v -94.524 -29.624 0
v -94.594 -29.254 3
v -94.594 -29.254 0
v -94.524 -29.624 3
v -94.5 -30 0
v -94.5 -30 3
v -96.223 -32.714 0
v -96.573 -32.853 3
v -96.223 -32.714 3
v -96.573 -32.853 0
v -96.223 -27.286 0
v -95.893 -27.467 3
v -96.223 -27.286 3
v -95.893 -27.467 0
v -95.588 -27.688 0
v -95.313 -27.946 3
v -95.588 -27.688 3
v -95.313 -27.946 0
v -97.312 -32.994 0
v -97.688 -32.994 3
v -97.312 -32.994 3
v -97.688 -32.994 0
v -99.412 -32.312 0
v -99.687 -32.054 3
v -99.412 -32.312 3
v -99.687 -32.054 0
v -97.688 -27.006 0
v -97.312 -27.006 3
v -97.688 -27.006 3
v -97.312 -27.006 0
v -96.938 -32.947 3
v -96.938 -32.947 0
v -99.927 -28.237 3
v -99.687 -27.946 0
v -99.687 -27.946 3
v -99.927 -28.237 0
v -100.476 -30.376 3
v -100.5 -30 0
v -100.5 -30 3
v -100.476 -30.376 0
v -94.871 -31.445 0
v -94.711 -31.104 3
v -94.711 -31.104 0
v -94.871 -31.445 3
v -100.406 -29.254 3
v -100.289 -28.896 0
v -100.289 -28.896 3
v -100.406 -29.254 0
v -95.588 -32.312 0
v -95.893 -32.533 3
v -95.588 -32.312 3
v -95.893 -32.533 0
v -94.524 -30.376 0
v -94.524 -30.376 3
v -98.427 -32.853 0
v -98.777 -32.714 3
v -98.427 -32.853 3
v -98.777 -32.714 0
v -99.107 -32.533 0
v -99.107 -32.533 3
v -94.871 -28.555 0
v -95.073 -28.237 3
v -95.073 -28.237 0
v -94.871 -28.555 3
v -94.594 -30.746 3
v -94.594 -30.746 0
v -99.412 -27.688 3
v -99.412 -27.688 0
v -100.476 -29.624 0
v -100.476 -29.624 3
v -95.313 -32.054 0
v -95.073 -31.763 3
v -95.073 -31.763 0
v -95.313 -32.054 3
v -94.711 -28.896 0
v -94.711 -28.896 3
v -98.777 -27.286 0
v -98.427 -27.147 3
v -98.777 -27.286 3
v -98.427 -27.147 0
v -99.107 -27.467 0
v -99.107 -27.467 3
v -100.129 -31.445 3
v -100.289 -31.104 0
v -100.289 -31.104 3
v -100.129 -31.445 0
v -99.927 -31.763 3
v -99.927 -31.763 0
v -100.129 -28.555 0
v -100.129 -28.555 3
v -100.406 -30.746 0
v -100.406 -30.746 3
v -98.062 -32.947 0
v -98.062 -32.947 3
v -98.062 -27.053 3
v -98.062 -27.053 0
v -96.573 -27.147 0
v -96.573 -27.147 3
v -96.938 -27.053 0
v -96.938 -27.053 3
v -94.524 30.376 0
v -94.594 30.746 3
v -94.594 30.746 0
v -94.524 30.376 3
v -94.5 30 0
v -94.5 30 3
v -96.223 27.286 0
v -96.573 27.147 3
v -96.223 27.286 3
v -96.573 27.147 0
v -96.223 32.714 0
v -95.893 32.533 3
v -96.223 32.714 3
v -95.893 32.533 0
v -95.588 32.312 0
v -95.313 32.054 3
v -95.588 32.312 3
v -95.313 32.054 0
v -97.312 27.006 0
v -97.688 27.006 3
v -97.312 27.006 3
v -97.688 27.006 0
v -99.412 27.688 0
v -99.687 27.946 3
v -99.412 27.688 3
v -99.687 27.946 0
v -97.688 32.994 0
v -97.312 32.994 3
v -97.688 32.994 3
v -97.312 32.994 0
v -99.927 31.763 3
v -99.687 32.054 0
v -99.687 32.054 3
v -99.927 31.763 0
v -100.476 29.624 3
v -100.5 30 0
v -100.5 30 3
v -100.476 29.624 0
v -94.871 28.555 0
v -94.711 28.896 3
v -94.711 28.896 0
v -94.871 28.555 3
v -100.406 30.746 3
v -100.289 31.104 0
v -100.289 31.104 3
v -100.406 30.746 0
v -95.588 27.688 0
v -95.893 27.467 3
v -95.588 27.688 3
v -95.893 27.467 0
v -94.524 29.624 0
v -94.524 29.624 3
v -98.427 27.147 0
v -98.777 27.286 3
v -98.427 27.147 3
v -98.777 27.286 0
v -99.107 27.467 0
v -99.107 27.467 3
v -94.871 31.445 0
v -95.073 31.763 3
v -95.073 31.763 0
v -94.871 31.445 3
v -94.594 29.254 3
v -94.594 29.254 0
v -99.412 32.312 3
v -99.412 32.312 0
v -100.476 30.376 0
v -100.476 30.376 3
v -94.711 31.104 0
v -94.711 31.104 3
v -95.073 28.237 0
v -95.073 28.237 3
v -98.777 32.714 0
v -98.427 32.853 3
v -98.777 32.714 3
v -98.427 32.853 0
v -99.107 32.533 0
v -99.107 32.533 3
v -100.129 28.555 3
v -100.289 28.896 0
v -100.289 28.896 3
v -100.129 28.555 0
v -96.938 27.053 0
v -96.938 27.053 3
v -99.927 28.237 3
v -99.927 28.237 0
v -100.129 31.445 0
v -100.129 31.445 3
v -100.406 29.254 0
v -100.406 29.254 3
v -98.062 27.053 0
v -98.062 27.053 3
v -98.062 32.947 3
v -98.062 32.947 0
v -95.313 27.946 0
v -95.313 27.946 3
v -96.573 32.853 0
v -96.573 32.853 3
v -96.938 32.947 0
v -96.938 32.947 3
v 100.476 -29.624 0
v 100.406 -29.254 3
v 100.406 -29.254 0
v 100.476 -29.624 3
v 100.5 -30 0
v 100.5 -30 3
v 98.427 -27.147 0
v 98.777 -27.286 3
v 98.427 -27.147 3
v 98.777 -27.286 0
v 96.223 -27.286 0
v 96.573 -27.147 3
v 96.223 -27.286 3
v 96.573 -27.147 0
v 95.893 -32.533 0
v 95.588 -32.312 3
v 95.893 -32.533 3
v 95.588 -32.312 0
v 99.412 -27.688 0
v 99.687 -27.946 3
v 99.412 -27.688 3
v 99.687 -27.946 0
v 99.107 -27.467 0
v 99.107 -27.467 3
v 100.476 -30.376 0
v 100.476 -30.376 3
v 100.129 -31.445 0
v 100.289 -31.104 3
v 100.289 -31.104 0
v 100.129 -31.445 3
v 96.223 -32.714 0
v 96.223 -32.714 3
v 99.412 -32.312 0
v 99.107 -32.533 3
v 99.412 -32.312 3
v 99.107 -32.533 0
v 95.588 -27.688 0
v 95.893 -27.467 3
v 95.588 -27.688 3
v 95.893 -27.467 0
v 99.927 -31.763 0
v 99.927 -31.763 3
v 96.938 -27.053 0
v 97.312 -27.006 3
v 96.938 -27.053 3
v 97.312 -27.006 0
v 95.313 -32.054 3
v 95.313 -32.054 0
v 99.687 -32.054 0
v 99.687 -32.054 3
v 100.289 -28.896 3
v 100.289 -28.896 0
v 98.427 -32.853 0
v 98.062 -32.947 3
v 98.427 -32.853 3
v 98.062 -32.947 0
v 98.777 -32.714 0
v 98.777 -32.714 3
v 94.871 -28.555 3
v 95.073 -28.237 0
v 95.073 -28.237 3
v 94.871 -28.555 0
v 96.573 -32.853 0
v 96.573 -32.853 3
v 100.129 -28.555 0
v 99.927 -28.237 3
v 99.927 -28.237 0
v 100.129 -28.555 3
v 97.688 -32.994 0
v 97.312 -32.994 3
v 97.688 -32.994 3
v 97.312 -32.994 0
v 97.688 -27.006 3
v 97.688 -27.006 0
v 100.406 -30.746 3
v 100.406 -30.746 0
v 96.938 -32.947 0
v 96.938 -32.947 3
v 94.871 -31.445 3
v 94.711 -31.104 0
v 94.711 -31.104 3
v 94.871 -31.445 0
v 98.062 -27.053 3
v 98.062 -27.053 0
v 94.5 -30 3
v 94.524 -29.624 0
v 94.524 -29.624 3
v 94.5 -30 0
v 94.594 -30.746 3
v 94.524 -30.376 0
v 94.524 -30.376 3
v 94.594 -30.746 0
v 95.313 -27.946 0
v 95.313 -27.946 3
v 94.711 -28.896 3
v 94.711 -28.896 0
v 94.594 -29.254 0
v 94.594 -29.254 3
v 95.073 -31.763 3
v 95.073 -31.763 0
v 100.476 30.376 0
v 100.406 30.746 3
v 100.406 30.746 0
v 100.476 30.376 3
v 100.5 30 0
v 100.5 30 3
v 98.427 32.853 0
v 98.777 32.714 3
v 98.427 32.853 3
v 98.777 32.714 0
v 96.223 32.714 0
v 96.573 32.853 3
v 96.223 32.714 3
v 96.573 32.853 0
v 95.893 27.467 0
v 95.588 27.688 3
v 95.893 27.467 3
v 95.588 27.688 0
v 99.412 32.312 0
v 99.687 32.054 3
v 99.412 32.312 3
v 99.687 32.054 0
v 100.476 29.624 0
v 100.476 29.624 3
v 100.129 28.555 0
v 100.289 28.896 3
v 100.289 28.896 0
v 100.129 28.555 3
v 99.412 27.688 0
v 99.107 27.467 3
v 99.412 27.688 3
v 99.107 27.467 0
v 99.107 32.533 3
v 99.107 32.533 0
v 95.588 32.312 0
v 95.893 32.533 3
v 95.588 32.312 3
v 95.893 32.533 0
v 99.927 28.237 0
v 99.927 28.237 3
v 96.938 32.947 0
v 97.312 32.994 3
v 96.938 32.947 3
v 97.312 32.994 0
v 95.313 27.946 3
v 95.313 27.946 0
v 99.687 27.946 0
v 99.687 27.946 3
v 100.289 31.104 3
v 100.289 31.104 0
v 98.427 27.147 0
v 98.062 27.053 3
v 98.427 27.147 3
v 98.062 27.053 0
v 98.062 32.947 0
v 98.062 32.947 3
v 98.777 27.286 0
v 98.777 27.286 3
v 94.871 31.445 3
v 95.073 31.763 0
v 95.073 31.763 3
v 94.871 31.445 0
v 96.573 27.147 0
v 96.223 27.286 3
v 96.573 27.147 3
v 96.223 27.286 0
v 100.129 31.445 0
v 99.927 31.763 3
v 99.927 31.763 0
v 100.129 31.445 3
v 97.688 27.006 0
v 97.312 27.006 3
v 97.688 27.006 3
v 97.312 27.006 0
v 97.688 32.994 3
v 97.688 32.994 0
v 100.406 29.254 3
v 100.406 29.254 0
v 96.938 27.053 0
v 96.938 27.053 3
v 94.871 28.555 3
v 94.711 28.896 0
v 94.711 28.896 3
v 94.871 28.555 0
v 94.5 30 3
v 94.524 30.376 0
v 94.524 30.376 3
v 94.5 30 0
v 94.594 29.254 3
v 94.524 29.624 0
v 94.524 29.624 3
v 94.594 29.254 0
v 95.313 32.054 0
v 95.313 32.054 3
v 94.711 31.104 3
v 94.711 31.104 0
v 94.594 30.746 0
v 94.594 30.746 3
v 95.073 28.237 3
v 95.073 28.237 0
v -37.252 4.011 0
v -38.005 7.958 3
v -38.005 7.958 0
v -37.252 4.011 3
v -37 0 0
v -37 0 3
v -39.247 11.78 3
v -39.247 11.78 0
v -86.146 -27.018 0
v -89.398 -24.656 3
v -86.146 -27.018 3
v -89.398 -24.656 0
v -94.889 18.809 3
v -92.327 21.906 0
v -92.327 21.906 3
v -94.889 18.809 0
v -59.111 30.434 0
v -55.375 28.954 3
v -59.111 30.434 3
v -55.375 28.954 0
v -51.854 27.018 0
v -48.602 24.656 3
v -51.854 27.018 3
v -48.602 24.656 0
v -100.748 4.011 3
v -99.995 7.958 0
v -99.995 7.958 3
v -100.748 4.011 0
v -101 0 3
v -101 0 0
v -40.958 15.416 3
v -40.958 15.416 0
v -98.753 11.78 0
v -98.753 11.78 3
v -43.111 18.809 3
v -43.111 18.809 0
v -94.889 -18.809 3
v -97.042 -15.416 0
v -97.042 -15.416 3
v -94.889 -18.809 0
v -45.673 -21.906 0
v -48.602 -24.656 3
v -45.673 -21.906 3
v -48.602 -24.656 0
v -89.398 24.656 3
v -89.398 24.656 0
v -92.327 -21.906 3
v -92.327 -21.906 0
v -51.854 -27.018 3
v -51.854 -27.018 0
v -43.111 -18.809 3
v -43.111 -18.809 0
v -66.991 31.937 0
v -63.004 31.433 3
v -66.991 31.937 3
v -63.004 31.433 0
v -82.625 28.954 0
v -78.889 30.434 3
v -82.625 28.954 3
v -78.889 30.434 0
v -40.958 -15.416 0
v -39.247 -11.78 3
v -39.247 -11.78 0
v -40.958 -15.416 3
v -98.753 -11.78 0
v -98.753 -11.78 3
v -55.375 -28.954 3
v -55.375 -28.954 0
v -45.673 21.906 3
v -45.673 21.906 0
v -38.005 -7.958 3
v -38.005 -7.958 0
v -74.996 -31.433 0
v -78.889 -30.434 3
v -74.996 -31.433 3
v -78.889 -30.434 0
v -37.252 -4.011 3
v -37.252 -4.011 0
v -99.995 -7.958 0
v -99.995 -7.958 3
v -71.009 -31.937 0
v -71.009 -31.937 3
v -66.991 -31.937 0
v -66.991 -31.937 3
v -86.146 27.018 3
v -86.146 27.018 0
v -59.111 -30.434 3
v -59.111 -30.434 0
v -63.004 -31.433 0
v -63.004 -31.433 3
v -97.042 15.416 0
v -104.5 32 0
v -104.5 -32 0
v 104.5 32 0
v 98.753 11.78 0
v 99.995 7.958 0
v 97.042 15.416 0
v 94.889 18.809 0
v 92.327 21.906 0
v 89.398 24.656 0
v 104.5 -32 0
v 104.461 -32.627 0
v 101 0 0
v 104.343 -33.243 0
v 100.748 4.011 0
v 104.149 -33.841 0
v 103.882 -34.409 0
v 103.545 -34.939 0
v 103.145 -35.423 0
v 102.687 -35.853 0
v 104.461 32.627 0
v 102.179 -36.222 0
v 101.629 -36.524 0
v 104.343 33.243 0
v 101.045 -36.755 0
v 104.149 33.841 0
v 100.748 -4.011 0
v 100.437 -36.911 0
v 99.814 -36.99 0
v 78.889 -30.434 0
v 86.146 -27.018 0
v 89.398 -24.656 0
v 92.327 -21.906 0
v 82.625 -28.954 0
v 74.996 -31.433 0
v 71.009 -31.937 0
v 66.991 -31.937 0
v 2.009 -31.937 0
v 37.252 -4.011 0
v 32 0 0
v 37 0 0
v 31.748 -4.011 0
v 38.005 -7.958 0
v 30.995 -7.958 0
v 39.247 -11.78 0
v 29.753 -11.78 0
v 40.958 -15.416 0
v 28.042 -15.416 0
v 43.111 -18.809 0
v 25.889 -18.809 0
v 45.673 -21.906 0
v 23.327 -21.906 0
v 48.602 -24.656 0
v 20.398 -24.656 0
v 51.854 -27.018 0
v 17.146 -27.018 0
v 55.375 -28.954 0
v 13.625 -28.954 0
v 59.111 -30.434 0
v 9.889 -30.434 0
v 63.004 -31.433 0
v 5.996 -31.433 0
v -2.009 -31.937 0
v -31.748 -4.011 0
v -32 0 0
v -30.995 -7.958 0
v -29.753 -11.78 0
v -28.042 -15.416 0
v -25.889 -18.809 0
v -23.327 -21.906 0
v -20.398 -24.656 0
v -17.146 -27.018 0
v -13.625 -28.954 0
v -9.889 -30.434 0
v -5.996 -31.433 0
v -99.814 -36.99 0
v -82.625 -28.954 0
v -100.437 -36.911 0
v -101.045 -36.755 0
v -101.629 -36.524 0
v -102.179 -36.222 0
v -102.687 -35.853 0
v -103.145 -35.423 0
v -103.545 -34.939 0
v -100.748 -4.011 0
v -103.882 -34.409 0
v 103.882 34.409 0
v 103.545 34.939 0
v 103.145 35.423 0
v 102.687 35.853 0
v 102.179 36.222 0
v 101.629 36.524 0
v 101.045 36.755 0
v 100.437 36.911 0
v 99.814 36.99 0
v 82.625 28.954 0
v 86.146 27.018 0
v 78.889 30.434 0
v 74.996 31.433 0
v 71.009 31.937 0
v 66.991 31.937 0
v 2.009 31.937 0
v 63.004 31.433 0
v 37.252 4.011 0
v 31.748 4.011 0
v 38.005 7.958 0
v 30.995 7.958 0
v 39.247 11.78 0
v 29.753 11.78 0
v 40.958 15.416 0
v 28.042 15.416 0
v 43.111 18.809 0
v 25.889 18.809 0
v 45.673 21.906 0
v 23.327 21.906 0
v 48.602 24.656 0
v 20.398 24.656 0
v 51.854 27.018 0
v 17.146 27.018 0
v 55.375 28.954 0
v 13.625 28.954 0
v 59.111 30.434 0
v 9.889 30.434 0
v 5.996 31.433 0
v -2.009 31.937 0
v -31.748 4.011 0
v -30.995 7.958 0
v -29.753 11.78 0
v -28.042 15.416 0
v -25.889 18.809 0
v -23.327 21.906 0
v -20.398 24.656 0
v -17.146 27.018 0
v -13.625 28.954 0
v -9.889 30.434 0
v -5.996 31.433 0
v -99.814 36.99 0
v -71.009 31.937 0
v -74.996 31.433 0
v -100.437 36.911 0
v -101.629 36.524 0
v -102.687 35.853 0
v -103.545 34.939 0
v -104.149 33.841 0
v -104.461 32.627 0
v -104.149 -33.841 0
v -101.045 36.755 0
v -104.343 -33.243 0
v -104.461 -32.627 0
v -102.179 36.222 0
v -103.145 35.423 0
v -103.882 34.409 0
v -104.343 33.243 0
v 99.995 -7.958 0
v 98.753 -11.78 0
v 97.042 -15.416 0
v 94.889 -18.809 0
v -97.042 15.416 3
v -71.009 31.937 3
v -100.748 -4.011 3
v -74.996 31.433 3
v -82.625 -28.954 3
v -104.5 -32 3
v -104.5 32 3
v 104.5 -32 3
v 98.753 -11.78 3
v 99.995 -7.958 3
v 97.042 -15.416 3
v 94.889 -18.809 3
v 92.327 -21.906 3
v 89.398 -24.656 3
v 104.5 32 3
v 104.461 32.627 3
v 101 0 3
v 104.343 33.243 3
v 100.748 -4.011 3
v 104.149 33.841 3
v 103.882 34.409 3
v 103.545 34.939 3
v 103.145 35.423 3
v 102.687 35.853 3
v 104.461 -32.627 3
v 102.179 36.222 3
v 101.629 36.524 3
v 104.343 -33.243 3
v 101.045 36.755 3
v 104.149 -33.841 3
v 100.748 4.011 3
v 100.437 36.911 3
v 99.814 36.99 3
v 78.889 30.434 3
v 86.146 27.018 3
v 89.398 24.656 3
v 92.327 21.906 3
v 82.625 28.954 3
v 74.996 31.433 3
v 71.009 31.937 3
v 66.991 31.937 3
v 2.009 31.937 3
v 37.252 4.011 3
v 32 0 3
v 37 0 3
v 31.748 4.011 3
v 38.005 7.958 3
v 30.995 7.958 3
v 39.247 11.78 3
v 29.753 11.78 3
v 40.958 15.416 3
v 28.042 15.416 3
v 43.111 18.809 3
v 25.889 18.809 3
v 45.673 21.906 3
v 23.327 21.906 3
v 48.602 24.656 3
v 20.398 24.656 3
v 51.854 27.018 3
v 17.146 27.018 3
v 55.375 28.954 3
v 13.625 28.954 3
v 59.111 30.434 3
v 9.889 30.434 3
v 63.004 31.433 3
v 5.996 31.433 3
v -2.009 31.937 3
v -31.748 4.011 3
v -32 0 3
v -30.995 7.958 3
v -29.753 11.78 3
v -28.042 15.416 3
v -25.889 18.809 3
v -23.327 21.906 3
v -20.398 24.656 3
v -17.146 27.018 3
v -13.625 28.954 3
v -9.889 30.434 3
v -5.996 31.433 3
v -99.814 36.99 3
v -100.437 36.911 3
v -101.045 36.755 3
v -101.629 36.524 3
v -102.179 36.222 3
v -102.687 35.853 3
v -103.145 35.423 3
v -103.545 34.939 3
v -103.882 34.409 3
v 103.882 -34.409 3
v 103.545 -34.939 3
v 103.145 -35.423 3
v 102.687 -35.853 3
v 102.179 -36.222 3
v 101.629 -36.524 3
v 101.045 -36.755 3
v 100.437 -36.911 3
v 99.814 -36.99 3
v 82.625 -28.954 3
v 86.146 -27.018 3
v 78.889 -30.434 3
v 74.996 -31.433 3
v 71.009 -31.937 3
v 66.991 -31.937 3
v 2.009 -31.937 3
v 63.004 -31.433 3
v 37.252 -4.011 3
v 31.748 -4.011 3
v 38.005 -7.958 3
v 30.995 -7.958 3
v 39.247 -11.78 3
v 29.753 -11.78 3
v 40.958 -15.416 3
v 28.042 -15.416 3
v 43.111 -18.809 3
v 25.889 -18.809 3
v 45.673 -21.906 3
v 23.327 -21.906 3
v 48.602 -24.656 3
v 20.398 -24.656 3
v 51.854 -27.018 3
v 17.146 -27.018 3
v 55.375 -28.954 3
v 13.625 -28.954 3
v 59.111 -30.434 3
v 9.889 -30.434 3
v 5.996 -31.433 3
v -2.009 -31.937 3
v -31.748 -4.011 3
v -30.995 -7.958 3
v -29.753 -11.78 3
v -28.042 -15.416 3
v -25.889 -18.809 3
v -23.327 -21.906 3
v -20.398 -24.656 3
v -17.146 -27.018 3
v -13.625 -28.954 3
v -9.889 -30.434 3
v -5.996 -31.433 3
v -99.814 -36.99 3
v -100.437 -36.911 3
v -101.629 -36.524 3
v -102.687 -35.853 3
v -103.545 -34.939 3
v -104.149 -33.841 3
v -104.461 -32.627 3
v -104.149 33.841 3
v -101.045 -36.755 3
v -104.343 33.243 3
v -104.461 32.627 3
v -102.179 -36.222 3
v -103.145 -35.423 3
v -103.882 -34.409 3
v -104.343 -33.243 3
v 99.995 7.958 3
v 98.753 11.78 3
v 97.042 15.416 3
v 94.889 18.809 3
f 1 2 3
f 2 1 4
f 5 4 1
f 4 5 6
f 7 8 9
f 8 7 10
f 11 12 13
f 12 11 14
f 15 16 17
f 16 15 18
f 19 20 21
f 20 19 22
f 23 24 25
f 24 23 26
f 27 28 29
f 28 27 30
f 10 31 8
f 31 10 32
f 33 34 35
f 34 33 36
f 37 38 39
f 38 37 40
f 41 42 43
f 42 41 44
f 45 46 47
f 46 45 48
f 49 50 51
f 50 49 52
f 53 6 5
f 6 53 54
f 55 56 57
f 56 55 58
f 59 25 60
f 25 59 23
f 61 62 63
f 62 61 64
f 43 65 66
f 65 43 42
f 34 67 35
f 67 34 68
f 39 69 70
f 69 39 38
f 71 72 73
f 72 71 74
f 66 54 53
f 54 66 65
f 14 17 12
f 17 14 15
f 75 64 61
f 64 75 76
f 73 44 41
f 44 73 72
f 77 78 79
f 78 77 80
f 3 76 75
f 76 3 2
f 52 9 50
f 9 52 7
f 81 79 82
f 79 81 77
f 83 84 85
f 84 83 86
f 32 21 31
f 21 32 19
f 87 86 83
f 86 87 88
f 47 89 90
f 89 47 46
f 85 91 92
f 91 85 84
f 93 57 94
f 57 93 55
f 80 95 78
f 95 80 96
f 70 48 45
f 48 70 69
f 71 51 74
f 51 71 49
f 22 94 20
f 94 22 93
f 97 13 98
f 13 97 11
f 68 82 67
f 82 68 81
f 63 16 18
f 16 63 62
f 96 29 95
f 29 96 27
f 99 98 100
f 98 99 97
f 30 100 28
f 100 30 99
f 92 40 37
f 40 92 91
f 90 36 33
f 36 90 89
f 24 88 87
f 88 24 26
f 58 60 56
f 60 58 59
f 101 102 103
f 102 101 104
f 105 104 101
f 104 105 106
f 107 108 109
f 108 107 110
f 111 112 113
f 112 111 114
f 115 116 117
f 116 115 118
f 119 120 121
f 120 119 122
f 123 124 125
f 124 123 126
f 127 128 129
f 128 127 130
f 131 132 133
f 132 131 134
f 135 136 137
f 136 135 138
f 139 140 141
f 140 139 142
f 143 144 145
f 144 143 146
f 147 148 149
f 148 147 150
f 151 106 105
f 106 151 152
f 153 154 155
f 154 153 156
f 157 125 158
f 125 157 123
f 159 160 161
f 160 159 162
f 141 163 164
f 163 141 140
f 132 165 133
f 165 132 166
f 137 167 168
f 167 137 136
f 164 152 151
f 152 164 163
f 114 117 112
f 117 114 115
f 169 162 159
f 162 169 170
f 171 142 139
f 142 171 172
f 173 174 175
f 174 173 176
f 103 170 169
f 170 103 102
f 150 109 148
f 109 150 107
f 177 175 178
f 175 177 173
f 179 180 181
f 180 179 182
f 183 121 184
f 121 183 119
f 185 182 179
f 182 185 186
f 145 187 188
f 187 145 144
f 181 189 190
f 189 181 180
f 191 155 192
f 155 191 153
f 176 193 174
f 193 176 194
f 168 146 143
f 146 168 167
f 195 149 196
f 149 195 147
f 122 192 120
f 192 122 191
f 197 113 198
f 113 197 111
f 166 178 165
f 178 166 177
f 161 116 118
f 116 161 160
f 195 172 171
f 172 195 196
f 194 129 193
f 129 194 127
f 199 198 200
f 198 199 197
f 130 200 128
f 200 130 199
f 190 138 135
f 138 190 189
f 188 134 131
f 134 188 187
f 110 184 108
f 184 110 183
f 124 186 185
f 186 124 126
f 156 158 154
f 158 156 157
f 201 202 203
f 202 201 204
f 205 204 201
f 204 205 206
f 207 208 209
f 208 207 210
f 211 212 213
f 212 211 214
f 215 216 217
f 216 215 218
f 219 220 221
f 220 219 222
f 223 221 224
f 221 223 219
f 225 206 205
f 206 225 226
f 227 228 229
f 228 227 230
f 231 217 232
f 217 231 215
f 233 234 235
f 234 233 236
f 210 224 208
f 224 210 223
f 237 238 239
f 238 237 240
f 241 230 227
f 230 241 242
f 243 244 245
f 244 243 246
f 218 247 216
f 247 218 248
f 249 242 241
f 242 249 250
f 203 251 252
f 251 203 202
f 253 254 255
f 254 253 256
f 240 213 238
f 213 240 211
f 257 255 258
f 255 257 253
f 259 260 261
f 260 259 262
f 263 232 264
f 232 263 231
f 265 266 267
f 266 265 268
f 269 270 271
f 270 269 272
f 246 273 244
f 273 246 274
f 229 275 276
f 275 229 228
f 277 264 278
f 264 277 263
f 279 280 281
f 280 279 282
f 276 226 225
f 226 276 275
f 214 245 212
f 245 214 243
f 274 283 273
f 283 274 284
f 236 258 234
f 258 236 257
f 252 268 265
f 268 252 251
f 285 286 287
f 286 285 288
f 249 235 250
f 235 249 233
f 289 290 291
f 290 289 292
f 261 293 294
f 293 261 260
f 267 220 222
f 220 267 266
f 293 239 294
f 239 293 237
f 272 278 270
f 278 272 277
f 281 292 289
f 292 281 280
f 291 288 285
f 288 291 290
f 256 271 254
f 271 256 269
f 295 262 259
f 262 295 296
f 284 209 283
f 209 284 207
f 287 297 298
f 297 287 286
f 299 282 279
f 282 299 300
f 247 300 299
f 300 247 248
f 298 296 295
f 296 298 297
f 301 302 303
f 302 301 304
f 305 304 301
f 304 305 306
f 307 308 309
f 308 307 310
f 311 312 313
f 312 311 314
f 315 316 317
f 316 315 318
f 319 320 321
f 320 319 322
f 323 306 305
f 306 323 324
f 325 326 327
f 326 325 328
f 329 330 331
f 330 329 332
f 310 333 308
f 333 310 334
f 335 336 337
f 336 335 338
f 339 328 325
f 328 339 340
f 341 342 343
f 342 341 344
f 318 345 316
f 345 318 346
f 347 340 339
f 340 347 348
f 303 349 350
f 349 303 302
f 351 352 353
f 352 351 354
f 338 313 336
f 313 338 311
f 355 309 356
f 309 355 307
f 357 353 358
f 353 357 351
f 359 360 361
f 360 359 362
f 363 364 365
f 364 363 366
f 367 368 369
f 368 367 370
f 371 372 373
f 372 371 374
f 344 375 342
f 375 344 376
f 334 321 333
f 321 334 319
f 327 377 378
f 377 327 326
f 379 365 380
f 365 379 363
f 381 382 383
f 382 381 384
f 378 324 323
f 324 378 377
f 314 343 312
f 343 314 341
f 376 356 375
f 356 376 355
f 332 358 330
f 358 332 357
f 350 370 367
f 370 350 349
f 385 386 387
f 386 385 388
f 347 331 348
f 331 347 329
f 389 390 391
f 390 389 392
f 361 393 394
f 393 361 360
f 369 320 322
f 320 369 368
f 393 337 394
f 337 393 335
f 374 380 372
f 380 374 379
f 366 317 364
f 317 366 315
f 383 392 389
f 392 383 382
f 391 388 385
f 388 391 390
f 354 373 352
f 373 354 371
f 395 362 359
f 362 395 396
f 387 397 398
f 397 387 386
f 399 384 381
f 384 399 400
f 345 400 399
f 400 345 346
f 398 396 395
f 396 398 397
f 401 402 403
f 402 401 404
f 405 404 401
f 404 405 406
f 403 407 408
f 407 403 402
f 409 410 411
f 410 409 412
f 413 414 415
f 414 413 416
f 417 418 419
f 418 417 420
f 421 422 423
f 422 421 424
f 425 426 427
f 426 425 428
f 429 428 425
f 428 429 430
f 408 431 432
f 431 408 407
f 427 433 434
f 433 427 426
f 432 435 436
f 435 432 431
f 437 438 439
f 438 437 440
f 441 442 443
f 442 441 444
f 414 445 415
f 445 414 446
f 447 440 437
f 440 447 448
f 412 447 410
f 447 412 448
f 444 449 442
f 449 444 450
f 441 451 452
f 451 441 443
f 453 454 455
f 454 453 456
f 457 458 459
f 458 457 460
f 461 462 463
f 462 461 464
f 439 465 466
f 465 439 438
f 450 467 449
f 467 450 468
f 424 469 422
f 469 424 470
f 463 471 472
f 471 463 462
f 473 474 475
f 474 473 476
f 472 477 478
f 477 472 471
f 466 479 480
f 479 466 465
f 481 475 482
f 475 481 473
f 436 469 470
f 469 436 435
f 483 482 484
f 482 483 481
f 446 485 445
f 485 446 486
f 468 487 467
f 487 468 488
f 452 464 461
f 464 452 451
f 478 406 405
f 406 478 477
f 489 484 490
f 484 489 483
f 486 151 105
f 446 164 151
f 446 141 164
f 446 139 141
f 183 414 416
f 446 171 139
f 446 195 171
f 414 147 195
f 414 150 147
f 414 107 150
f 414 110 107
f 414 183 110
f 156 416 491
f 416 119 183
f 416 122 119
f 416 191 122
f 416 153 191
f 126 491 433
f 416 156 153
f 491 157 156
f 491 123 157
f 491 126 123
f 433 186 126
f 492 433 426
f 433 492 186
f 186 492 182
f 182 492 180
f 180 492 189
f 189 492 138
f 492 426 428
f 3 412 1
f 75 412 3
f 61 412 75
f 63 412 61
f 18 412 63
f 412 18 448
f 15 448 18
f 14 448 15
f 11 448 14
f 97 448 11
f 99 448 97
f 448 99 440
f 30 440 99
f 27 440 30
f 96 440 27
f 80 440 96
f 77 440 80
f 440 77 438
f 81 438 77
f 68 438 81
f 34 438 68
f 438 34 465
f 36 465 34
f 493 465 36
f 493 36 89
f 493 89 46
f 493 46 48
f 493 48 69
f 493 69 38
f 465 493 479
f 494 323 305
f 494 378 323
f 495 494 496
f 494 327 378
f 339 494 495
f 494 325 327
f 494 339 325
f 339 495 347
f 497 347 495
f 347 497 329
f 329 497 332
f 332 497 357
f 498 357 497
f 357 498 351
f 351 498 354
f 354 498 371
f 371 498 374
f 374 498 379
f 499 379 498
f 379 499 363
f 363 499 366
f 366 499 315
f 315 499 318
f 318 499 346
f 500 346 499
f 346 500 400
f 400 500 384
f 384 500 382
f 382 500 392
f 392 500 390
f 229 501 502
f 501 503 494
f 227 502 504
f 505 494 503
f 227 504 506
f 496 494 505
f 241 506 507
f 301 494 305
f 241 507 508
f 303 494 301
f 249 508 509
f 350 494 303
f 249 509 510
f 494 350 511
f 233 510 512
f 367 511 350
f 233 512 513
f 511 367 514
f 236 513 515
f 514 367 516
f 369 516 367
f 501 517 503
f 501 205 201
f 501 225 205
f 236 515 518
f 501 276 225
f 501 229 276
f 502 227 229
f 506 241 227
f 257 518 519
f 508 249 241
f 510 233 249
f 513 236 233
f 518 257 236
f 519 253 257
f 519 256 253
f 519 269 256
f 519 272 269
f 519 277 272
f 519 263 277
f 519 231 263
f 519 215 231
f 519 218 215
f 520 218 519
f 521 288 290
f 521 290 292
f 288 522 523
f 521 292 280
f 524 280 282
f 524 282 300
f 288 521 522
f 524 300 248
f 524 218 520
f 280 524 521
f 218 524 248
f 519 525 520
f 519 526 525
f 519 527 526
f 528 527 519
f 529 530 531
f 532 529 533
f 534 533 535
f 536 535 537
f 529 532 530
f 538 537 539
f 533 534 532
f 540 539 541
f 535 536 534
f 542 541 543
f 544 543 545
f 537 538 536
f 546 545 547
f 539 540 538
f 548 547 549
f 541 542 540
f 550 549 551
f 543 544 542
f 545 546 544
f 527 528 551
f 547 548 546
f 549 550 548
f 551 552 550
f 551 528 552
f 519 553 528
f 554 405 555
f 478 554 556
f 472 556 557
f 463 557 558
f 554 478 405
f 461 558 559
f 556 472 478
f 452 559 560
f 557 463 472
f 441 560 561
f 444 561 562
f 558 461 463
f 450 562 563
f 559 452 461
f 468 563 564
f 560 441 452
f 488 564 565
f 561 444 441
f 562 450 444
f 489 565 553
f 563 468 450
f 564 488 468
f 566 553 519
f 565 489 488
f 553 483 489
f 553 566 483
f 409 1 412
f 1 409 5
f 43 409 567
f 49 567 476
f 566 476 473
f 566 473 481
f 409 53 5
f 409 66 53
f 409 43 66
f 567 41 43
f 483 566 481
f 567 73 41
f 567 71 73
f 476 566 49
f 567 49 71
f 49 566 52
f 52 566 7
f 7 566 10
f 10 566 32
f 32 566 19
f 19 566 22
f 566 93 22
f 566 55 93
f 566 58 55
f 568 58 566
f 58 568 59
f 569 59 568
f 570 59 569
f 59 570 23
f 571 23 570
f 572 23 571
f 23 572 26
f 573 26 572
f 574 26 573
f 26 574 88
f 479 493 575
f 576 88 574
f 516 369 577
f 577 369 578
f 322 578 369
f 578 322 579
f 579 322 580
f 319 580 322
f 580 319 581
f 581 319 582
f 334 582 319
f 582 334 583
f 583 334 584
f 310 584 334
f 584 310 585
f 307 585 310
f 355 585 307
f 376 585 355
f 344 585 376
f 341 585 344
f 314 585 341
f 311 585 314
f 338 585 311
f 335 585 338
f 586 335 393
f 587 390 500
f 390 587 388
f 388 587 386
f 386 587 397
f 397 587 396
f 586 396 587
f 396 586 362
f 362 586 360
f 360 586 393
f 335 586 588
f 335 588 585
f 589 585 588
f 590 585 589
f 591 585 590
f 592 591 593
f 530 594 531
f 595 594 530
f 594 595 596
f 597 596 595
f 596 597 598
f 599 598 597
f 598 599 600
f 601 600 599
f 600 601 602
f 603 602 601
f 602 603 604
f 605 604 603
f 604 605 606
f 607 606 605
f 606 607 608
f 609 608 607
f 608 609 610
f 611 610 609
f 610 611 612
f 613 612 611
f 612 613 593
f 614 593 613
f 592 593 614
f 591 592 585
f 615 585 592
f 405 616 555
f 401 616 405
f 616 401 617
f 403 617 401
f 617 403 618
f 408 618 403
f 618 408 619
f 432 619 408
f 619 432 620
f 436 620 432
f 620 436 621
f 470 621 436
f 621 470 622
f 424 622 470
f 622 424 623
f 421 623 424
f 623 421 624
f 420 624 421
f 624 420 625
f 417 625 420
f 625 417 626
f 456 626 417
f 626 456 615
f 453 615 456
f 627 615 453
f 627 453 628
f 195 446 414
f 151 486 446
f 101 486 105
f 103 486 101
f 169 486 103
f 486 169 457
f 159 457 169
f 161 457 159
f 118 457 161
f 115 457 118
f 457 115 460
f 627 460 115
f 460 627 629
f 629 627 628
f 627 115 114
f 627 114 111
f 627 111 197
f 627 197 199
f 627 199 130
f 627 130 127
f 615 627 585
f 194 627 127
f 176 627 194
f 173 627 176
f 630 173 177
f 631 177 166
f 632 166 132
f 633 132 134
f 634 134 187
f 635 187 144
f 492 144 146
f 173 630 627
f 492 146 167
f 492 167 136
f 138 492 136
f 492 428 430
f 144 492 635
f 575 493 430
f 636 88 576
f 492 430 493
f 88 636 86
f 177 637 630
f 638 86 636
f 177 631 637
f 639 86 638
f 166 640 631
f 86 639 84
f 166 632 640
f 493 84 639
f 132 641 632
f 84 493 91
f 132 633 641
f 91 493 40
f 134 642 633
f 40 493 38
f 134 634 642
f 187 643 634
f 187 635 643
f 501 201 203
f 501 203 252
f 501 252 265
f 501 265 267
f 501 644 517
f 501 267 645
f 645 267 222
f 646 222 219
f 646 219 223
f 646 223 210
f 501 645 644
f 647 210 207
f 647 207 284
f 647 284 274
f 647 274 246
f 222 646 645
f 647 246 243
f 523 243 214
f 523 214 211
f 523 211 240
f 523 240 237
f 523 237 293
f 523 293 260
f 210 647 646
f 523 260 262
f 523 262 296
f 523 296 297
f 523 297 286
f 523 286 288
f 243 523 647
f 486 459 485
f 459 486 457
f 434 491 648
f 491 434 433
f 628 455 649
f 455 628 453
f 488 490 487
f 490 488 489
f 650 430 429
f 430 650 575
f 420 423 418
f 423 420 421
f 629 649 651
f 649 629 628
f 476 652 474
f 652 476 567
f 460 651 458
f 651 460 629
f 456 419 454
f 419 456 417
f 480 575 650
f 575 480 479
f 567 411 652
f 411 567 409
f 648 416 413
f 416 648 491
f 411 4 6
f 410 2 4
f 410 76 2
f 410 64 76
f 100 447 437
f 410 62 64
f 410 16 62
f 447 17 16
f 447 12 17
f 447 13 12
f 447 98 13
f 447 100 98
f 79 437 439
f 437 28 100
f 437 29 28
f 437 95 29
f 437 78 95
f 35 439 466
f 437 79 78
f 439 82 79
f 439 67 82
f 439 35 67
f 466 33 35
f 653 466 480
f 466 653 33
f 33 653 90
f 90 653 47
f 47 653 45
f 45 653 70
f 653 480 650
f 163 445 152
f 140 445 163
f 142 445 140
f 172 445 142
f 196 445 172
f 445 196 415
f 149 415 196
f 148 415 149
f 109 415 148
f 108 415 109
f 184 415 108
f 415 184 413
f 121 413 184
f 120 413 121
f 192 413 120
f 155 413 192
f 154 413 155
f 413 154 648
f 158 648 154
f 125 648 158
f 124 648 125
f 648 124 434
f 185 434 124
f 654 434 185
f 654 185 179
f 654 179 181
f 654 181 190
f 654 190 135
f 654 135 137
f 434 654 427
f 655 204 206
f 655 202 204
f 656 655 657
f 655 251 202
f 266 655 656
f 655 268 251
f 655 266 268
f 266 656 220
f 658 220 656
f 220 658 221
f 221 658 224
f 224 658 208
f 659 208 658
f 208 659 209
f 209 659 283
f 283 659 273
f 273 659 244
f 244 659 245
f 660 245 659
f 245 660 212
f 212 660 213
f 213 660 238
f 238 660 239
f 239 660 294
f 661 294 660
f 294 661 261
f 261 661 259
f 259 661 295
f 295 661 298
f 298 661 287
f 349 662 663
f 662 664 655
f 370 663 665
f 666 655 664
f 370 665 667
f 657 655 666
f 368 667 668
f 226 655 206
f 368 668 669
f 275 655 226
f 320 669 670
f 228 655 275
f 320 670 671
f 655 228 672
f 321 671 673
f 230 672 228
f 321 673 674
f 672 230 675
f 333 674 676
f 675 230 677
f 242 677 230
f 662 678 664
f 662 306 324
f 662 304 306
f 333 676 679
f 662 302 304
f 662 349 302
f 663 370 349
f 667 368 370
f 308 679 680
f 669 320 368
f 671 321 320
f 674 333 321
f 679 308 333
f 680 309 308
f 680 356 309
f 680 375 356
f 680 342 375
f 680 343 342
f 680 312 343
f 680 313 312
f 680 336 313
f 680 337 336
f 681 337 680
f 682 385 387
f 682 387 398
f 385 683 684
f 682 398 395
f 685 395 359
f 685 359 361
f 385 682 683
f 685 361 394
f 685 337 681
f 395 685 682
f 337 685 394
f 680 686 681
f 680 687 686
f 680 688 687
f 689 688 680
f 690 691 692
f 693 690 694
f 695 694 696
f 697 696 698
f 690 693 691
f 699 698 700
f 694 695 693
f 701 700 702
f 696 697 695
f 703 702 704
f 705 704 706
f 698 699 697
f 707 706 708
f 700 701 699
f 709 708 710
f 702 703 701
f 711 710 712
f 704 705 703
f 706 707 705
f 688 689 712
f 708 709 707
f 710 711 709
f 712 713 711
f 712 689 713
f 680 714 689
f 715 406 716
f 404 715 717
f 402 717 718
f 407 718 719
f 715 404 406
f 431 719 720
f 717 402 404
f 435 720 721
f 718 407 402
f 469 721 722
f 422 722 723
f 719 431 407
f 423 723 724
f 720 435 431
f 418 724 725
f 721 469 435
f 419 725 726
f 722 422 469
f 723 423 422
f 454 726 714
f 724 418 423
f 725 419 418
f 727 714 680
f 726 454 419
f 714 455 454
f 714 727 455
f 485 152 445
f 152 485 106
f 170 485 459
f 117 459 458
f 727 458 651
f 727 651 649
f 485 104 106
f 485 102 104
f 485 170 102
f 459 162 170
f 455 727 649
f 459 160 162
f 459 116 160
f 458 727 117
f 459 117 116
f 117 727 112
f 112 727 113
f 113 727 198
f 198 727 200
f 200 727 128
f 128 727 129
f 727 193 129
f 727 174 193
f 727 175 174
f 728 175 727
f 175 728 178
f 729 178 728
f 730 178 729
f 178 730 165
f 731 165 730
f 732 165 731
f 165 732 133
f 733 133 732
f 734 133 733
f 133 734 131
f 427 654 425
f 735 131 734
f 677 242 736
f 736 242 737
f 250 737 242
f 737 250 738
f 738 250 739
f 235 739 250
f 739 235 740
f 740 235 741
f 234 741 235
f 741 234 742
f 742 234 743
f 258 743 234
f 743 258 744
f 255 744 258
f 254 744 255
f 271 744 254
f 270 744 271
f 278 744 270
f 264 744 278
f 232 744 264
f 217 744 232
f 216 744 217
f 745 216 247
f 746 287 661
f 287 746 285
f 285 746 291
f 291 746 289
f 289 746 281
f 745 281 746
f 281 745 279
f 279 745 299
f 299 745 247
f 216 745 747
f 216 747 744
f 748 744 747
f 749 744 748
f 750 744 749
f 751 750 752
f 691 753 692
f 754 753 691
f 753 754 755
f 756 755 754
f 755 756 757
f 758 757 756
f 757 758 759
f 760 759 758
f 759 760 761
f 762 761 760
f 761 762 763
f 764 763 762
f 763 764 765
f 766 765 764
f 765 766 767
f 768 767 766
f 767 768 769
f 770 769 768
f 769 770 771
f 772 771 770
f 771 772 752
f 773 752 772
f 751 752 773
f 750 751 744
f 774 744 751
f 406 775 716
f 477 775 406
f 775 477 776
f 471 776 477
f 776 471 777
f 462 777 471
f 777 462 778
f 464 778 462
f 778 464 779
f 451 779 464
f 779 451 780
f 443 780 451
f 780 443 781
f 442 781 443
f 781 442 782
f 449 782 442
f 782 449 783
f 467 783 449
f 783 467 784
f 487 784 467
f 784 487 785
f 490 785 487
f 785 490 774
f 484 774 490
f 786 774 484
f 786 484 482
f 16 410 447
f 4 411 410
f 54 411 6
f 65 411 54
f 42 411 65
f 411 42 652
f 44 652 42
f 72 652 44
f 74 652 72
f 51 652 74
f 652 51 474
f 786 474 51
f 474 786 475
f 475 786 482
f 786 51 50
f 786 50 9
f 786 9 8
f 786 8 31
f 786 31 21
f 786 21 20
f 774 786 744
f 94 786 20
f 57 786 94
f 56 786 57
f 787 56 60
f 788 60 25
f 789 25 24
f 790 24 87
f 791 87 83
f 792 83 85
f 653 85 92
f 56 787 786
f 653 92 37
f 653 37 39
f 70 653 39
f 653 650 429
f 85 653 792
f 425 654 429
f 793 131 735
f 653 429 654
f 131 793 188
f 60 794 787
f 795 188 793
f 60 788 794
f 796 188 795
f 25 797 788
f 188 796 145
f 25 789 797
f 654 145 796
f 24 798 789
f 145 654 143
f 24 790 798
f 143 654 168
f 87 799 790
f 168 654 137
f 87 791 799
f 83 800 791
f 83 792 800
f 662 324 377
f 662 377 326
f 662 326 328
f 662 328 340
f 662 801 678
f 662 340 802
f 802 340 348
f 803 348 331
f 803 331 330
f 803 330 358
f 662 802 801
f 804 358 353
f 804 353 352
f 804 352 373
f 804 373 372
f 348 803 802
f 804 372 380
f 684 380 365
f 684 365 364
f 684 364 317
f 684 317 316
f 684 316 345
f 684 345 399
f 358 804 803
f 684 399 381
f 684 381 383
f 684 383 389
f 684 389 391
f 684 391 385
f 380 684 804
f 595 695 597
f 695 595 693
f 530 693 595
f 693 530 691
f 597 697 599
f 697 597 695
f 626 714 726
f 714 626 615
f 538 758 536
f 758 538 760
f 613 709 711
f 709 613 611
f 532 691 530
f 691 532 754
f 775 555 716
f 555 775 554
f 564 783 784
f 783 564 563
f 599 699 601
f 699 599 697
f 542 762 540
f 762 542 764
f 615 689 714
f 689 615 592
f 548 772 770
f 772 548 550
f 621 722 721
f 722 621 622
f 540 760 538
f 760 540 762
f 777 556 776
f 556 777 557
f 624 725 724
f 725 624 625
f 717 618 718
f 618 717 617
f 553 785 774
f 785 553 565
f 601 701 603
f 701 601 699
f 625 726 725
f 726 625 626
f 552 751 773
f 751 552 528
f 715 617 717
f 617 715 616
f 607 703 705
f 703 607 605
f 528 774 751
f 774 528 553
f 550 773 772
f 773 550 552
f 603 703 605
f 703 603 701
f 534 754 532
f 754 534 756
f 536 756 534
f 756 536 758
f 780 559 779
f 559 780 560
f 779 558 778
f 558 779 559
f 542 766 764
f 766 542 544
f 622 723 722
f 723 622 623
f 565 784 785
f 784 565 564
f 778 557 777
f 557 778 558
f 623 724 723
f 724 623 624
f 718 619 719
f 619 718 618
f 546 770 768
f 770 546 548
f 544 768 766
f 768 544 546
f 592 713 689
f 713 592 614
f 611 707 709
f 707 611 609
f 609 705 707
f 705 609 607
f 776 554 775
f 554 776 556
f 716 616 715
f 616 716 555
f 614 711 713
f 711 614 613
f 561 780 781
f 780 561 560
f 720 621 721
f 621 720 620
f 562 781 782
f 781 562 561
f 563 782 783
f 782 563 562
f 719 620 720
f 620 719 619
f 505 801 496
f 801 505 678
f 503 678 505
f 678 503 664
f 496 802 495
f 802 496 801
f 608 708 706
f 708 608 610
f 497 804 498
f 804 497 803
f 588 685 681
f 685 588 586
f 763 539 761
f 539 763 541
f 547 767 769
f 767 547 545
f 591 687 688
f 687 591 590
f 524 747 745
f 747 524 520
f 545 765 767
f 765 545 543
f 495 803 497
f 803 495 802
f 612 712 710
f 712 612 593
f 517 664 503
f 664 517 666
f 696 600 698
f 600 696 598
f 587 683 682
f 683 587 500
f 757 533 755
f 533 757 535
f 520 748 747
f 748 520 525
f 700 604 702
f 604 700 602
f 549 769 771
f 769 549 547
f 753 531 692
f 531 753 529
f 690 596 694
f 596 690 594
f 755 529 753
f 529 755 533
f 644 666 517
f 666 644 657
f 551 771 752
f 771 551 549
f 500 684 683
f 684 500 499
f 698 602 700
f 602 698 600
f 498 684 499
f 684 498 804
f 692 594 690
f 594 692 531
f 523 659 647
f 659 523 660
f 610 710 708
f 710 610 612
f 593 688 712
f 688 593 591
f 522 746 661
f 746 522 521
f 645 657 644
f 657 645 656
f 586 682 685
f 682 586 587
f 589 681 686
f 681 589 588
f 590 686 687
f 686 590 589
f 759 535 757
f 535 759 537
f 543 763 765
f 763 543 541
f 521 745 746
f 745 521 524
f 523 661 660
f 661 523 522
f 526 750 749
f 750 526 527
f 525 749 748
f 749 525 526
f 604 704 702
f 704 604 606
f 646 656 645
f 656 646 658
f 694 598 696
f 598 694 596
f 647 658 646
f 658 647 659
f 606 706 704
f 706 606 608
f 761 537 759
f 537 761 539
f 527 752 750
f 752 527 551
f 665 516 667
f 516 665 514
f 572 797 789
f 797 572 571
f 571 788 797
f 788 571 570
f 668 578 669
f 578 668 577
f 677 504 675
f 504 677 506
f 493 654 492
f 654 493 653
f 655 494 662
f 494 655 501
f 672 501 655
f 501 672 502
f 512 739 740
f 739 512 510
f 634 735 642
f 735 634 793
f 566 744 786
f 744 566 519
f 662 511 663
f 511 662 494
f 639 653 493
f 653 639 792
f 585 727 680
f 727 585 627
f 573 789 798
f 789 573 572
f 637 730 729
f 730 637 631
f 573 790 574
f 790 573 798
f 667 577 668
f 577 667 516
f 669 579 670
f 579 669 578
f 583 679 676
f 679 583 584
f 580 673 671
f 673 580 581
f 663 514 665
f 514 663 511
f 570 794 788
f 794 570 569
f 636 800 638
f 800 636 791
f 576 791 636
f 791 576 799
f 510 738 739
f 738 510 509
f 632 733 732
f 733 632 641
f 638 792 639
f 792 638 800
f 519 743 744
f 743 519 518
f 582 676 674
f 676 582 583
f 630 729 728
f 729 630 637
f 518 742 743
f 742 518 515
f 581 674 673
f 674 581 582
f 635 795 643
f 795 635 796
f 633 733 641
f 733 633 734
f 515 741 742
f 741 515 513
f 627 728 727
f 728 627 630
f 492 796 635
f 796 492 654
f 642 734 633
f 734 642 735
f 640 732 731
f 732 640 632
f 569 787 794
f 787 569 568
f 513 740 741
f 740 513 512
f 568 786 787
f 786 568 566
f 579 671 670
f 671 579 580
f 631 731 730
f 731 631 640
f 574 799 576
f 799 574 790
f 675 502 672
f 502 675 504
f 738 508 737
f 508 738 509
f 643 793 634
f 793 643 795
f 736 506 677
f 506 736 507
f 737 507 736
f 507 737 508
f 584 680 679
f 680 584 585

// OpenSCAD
$fn = 50;


difference() {
	union() {
		hull() {
			translate(v = [-99.5000000000, 32.0000000000, 0]) {
				cylinder(h = 3, r = 5);
			}
			translate(v = [99.5000000000, 32.0000000000, 0]) {
				cylinder(h = 3, r = 5);
			}
			translate(v = [-99.5000000000, -32.0000000000, 0]) {
				cylinder(h = 3, r = 5);
			}
			translate(v = [99.5000000000, -32.0000000000, 0]) {
				cylinder(h = 3, r = 5);
			}
		}
	}
	union() {
		#translate(v = [-97.5000000000, -30.0000000000, -100.0000000000]) {
			cylinder(h = 200, r = 3.0000000000);
		}
		#translate(v = [-97.5000000000, 30.0000000000, -100.0000000000]) {
			cylinder(h = 200, r = 3.0000000000);
		}
		#translate(v = [97.5000000000, -30.0000000000, -100.0000000000]) {
			cylinder(h = 200, r = 3.0000000000);
		}
		#translate(v = [97.5000000000, 30.0000000000, -100.0000000000]) {
			cylinder(h = 200, r = 3.0000000000);
		}
		#translate(v = [-69.0000000000, 0, 0]) {
			cylinder(h = 3, r = 32.0000000000);
		}
		#cylinder(h = 3, r = 32.0000000000);
		#translate(v = [69.0000000000, 0, 0]) {
			cylinder(h = 3, r = 32.0000000000);
		}
	}
}
